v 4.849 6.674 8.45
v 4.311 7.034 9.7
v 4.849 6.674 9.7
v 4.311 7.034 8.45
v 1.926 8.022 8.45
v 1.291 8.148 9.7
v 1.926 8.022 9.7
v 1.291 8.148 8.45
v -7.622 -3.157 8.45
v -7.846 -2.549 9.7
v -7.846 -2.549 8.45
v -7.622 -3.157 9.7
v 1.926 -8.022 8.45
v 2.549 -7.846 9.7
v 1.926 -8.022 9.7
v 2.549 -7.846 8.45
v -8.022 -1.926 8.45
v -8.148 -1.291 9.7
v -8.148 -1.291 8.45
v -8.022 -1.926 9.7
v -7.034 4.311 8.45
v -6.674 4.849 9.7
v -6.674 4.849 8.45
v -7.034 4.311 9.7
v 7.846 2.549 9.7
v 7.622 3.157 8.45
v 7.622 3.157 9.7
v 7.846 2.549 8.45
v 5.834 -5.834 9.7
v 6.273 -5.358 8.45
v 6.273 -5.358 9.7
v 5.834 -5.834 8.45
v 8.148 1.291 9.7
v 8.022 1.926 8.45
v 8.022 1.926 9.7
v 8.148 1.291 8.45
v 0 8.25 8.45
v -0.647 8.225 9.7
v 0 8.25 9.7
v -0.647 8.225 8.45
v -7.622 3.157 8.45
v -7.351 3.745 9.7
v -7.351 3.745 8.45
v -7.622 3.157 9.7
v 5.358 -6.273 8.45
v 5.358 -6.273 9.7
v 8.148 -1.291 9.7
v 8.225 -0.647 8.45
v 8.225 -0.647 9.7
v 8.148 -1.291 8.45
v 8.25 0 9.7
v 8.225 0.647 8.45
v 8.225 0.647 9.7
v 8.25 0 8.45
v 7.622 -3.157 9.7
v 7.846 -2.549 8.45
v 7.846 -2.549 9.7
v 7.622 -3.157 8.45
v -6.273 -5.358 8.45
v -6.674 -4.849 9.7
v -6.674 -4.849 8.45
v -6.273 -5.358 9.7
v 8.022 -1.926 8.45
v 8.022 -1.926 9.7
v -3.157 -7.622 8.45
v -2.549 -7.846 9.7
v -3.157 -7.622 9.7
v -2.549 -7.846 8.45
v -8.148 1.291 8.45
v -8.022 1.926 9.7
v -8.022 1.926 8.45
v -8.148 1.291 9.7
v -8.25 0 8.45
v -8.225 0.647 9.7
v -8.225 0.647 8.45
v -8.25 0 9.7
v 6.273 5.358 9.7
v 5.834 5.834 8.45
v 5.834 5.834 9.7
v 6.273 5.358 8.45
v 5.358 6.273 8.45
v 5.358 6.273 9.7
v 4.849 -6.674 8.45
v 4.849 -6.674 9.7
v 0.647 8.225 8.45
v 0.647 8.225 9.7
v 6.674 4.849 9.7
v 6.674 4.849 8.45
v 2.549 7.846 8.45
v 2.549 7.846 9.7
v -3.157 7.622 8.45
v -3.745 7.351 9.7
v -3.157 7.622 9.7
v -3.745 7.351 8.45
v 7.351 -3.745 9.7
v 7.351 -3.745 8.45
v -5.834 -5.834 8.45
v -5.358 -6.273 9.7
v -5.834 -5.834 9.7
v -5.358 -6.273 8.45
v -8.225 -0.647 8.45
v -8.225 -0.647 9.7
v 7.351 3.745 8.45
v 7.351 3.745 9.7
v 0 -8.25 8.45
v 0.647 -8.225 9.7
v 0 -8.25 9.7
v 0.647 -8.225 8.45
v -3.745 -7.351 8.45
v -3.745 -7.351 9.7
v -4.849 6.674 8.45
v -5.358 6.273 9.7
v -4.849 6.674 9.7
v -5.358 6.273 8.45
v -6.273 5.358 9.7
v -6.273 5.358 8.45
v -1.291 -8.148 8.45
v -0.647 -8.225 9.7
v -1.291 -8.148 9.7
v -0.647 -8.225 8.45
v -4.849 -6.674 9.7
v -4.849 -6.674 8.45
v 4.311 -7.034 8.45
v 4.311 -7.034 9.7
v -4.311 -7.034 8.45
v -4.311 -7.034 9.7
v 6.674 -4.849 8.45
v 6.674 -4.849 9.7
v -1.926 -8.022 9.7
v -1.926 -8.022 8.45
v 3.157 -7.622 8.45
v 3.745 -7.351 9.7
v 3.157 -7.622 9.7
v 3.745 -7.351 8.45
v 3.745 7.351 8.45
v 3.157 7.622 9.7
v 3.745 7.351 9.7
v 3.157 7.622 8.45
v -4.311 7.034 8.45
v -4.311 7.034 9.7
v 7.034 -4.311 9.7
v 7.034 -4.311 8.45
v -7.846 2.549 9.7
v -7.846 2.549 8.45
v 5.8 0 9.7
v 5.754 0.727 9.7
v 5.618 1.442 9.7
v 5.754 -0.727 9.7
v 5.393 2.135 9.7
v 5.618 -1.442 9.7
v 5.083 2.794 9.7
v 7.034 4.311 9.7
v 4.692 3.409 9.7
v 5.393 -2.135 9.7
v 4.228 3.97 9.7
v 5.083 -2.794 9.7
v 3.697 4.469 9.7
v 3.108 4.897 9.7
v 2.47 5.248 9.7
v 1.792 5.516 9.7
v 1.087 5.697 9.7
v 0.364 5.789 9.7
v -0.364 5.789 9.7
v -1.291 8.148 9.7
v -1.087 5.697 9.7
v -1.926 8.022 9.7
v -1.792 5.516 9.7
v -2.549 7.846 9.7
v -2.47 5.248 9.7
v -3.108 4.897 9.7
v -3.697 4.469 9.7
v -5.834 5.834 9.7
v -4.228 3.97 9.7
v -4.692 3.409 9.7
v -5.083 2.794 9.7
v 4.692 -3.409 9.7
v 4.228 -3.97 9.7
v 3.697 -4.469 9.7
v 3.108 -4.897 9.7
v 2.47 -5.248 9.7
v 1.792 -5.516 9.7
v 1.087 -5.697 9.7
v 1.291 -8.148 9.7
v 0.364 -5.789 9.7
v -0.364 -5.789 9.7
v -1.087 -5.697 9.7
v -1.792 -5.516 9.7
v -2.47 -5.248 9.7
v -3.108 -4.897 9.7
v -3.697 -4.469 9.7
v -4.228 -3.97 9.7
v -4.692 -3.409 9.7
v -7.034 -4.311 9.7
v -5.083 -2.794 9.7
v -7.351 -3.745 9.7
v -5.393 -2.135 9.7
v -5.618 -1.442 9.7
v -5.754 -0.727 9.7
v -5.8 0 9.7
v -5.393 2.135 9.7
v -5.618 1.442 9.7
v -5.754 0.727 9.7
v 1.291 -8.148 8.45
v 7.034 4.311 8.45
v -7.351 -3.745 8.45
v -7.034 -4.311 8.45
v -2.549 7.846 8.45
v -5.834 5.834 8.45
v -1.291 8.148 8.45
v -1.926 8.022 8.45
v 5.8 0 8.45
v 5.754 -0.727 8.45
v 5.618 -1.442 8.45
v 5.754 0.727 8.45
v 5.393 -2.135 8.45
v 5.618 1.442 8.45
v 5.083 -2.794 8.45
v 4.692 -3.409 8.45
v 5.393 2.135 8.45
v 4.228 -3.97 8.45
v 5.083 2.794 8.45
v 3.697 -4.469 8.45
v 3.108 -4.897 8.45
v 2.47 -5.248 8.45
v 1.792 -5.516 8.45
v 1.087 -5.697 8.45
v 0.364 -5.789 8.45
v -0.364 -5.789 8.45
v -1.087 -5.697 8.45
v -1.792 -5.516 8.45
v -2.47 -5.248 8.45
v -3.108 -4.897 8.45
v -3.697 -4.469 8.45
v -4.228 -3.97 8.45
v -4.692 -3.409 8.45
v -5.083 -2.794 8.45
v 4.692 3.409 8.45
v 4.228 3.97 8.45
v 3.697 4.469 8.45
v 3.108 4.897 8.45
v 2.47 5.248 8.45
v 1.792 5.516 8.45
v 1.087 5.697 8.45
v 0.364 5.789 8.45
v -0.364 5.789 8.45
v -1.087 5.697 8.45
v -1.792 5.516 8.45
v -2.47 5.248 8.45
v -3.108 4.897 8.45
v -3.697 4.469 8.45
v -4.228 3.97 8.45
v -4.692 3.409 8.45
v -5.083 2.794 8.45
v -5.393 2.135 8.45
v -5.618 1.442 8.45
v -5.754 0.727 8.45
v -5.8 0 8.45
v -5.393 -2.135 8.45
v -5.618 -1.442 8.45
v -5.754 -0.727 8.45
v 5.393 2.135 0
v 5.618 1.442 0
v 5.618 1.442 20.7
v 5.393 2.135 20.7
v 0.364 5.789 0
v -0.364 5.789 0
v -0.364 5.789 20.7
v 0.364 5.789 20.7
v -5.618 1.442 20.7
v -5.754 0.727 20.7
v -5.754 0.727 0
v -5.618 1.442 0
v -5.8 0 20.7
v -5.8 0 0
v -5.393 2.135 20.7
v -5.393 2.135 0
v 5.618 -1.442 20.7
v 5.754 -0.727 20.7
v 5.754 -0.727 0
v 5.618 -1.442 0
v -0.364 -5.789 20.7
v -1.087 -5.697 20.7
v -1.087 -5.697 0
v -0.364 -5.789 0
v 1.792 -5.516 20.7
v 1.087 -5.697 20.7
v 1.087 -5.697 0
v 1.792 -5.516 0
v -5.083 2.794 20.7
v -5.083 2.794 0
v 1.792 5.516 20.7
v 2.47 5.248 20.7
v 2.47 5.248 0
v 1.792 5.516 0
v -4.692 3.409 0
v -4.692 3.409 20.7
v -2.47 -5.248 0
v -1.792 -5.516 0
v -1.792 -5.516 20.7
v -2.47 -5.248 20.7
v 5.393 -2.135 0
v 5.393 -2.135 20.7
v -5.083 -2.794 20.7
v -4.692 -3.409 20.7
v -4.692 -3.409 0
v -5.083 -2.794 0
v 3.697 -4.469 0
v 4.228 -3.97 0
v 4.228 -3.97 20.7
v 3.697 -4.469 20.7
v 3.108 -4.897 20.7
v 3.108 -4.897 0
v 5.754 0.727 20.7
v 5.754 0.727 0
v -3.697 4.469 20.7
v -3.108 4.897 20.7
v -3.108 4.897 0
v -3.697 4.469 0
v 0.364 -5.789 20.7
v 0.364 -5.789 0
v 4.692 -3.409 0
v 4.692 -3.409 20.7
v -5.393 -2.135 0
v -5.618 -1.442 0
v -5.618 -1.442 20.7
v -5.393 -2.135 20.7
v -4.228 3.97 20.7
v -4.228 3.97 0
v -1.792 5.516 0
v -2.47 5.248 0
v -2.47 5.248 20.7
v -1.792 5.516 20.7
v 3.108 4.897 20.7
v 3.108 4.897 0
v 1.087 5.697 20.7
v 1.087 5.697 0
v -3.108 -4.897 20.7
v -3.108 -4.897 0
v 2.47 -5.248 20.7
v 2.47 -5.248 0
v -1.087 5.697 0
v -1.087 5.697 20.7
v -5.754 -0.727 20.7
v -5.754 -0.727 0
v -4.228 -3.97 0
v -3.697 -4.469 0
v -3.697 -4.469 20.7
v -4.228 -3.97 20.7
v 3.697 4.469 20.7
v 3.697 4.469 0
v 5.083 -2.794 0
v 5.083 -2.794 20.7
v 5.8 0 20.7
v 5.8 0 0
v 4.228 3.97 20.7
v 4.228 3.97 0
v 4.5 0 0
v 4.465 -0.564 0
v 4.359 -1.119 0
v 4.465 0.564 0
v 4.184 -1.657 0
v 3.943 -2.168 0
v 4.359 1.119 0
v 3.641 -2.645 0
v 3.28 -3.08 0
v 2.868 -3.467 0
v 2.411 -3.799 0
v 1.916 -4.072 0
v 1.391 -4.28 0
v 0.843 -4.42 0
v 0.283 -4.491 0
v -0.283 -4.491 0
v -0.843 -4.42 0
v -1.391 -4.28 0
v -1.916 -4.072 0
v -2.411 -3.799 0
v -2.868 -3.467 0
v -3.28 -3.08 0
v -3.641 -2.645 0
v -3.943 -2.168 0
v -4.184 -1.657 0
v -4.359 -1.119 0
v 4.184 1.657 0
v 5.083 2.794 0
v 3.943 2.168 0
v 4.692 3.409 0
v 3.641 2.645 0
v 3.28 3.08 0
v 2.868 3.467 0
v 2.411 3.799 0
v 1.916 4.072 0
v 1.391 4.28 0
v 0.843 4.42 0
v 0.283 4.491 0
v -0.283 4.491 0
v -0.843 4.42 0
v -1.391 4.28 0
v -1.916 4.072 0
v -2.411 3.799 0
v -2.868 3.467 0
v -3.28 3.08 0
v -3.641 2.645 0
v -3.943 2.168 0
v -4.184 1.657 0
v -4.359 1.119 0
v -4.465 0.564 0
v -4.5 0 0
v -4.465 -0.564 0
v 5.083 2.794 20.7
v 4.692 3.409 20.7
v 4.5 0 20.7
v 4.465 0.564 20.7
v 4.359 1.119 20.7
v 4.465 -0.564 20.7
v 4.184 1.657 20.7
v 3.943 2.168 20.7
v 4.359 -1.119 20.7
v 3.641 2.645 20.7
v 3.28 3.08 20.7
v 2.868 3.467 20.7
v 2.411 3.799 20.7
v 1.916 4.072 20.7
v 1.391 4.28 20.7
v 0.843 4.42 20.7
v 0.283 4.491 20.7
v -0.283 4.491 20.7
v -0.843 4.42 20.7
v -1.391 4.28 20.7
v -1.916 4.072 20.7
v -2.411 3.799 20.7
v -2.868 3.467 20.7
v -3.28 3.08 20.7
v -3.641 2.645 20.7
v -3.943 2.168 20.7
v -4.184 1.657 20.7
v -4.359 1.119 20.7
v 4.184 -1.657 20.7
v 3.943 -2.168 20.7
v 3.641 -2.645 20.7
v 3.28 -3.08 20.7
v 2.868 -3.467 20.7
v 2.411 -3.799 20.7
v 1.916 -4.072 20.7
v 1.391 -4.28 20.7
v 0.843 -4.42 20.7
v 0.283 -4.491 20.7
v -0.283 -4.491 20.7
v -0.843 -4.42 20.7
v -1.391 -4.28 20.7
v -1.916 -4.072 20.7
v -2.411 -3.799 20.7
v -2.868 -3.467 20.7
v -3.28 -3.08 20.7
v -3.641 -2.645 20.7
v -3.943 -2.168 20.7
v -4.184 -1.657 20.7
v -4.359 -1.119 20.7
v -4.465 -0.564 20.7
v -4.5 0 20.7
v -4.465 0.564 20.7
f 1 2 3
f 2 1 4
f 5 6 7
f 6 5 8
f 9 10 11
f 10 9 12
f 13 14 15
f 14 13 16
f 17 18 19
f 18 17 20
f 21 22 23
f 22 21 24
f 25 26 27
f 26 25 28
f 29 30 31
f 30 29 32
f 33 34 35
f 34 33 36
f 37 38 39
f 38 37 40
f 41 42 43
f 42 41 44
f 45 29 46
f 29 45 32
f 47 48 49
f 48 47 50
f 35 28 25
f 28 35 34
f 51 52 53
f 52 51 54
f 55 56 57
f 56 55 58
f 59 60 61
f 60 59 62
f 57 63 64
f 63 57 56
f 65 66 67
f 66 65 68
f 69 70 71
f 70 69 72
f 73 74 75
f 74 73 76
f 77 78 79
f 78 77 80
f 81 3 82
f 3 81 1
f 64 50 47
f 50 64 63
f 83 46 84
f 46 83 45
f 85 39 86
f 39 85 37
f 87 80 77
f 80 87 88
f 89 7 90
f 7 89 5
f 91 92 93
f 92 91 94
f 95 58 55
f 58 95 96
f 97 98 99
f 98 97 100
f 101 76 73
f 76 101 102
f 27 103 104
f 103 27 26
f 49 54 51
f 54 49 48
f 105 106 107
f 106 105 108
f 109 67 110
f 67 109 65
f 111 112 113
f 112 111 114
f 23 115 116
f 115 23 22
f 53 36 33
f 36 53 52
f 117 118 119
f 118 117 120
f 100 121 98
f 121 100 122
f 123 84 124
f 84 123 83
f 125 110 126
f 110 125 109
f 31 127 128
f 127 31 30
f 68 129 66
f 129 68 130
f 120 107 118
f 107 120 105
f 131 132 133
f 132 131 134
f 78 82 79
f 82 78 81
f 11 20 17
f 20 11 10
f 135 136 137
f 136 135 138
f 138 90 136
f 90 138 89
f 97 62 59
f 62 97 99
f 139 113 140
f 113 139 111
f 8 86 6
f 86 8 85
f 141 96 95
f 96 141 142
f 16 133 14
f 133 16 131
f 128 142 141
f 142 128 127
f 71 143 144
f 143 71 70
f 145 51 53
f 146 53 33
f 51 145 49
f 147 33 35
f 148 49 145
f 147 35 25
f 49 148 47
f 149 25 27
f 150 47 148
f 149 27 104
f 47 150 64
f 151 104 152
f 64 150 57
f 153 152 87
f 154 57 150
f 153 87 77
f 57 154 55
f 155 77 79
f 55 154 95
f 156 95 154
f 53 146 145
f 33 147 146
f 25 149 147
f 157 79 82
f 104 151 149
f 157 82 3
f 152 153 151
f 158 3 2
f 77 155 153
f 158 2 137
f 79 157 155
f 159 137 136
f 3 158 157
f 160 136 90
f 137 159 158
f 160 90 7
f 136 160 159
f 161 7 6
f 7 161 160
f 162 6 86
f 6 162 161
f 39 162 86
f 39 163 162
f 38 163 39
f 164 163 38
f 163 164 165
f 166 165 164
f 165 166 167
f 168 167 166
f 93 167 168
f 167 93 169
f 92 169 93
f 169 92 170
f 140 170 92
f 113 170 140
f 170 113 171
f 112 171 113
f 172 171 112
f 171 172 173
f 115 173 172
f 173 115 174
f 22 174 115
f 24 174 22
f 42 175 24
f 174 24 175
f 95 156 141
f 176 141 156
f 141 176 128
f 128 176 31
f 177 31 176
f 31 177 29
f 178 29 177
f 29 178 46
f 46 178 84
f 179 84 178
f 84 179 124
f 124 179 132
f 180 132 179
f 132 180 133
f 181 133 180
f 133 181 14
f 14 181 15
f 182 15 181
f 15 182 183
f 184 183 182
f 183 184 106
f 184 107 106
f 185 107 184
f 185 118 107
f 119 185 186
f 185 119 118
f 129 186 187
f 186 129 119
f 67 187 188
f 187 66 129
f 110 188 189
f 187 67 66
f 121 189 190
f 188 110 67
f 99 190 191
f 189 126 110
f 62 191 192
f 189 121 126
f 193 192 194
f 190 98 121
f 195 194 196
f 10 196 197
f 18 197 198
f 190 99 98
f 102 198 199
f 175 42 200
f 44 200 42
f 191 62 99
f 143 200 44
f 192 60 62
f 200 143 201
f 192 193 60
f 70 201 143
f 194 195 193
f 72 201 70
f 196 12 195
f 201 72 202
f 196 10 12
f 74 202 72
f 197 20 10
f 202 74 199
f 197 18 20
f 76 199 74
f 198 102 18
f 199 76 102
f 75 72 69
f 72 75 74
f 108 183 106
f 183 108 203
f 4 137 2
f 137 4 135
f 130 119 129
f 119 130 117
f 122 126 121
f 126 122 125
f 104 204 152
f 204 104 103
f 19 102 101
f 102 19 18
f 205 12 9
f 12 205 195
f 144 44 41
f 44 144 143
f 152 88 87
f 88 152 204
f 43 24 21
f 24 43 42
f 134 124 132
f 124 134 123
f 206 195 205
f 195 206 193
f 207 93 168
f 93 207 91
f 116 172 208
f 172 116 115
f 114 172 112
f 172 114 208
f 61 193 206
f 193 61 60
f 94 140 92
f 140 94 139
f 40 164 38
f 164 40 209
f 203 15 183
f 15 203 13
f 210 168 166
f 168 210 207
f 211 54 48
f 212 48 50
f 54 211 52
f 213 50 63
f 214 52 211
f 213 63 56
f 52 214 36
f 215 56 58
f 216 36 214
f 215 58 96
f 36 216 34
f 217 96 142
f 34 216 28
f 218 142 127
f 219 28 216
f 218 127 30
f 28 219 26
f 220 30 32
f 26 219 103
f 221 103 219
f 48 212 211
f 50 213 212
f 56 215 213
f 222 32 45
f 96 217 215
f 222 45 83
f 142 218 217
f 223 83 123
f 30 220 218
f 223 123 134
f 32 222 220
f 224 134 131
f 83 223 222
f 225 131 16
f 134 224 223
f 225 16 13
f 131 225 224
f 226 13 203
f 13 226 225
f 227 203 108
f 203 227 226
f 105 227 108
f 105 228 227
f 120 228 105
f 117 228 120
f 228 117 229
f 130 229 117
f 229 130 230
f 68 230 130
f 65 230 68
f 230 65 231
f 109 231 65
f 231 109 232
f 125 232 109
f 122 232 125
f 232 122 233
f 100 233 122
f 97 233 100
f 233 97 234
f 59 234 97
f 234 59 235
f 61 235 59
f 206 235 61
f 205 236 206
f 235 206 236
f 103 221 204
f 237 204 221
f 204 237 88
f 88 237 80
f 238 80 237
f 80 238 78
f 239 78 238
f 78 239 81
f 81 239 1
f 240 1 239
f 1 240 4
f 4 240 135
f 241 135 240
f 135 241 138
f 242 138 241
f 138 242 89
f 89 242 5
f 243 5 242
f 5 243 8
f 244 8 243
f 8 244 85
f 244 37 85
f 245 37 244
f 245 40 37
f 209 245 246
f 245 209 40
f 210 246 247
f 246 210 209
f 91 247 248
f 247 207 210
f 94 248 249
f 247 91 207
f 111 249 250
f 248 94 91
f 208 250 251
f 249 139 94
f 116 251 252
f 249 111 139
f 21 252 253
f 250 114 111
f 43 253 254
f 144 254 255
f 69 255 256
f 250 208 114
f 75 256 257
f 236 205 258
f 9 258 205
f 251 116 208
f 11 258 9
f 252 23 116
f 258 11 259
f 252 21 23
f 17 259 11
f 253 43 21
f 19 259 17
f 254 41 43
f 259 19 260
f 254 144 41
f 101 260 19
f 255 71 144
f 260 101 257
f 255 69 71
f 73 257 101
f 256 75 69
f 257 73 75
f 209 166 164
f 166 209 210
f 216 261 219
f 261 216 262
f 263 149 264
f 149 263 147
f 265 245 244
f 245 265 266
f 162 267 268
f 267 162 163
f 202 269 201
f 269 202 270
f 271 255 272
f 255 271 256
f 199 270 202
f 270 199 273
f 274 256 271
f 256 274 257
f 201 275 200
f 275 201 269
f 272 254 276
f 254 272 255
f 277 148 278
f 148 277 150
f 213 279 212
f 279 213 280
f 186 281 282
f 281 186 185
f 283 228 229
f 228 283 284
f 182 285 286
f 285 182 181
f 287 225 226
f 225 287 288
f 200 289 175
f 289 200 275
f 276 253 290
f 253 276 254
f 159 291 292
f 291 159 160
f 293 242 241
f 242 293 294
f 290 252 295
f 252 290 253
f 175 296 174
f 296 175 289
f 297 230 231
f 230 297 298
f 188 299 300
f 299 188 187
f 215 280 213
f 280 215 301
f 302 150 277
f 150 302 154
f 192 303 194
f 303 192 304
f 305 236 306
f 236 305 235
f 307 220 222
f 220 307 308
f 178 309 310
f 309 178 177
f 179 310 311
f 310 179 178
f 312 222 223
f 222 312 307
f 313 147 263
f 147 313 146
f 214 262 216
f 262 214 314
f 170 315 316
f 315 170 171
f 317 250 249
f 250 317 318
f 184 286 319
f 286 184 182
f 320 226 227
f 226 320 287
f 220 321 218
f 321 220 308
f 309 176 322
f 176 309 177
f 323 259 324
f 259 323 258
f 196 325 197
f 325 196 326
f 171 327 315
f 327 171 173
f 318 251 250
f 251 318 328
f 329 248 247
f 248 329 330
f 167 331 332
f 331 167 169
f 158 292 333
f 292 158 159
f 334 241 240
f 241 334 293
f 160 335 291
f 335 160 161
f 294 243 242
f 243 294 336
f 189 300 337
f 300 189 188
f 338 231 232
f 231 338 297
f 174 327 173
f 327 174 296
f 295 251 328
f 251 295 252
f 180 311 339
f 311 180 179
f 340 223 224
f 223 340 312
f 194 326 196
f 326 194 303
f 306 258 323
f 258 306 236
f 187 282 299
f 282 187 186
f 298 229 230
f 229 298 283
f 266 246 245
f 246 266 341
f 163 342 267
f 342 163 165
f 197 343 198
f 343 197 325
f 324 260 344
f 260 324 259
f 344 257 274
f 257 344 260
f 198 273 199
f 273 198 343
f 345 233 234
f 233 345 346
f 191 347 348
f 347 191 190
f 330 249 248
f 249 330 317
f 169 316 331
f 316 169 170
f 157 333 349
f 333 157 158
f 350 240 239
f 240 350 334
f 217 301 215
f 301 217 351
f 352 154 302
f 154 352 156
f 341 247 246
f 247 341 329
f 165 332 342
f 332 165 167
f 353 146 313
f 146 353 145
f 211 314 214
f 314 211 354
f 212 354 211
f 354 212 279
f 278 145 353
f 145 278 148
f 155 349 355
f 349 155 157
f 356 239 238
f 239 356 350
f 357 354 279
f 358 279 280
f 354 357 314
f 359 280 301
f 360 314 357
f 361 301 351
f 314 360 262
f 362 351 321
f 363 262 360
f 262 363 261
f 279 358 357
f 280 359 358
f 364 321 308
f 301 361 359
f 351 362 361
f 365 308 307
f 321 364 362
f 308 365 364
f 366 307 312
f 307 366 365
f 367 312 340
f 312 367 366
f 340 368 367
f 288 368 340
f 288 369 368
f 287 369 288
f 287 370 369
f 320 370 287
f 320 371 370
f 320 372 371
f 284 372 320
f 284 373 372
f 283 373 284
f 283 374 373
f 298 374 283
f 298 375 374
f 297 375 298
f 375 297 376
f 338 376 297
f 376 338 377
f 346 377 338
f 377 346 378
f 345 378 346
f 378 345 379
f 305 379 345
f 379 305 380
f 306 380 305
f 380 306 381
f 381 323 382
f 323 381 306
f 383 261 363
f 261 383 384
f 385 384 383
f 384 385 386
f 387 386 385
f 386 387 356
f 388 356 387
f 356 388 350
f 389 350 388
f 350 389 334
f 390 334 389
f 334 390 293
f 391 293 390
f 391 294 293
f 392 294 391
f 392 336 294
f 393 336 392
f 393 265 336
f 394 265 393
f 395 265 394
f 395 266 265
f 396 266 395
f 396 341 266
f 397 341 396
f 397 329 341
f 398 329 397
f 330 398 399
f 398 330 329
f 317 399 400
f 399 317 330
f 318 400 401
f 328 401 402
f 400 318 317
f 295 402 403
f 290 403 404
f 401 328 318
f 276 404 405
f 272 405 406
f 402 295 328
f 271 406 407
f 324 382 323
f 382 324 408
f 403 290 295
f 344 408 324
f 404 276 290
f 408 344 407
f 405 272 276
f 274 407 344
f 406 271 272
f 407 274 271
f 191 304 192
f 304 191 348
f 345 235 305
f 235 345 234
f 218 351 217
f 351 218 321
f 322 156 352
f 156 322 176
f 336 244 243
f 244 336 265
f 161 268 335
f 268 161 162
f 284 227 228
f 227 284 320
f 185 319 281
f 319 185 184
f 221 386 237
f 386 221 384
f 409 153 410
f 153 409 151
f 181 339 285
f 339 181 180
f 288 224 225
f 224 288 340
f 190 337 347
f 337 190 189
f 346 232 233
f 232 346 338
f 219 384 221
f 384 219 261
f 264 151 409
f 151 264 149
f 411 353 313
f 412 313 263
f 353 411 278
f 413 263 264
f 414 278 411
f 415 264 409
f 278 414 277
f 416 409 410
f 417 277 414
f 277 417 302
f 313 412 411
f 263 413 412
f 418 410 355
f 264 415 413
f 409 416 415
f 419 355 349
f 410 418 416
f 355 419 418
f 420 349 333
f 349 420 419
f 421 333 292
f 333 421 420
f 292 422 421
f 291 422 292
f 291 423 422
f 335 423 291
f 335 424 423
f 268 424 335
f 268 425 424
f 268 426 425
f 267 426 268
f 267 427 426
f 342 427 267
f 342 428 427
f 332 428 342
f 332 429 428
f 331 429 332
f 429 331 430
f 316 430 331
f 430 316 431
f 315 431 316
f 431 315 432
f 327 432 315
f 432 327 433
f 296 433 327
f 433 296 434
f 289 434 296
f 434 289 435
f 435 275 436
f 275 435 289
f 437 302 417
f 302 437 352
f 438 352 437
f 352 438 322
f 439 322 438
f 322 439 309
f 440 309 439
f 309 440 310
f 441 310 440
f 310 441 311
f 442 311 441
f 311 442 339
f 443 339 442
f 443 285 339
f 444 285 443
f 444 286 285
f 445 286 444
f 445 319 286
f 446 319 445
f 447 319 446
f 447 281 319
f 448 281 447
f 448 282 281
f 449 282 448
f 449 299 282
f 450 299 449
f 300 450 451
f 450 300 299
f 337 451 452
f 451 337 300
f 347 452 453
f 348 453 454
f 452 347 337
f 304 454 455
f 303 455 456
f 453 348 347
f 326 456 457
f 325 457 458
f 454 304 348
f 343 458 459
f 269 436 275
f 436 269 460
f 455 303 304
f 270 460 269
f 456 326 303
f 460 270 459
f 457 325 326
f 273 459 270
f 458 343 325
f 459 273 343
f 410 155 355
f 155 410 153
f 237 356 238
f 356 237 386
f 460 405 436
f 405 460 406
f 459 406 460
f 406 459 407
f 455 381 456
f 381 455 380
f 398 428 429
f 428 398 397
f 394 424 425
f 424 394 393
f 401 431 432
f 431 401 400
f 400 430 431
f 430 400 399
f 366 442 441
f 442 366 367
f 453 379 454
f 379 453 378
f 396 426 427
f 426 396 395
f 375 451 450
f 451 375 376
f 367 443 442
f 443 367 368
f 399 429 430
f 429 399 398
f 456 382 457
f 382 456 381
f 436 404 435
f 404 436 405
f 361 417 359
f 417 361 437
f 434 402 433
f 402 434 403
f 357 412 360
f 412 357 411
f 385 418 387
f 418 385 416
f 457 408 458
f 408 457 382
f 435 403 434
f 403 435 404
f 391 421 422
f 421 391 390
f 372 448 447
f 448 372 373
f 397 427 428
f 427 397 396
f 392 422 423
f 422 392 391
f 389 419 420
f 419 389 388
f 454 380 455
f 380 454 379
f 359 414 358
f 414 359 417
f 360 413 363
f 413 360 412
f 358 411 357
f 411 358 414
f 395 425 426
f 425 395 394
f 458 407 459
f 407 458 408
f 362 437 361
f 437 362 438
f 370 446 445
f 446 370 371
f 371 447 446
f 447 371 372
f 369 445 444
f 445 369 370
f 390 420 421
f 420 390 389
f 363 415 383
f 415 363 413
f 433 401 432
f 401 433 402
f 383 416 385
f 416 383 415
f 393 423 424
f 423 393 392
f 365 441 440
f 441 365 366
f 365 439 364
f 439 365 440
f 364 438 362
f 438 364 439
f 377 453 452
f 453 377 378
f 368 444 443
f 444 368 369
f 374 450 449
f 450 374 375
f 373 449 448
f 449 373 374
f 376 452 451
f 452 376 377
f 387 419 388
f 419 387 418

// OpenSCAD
// file: common.scad
// Measurements and routines common across adapters.

band_full_thickness = 1.25;    // thickest point of the band
band_full_diameter = 16.5;  // diameter at widest point of band

// profile = [
//     [0,0],
//     [band_edge_diameter / 2, 0],
//     [band_full_diameter / 2, (band_full_thickness - band_edge_thickness) / 2],
//     [band_full_diameter / 2, band_full_thickness - ((band_full_thickness - band_edge_thickness) / 2)],
//     [band_edge_diameter / 2, band_full_thickness],
//     [0,band_full_thickness],
// ];

profile = [
    [0,0],
    [band_full_diameter / 2, 0],
    [band_full_diameter / 2, band_full_thickness],
    [0,band_full_thickness],
];

module band() {
    rotate_extrude($fn=80) polygon(points=profile);
}
// main file
// Plotter pen adapter for a graphite stick
//
// Modified by Sasha Kovar <sasha-thing@arcocene.org>
// from a design by Brian Boucheron <brian@boucheron.org>

include <common.scad>;

body_outer_diameter = 11.6; // outer diameter of the main body
body_inner_diameter = 9; // inner diameter of the main body

translate([0,0,37])
rotate(a=[0,180,0]) {
    difference() {
        union() {
            translate([0,0,27.3]) band();
            translate([0,0,27.3 - 11]) cylinder(r=body_outer_diameter/2, h=20.7, $fn=50);
        }
        cylinder(r=body_inner_diameter/2, h=50, $fn=50);
    }
}
